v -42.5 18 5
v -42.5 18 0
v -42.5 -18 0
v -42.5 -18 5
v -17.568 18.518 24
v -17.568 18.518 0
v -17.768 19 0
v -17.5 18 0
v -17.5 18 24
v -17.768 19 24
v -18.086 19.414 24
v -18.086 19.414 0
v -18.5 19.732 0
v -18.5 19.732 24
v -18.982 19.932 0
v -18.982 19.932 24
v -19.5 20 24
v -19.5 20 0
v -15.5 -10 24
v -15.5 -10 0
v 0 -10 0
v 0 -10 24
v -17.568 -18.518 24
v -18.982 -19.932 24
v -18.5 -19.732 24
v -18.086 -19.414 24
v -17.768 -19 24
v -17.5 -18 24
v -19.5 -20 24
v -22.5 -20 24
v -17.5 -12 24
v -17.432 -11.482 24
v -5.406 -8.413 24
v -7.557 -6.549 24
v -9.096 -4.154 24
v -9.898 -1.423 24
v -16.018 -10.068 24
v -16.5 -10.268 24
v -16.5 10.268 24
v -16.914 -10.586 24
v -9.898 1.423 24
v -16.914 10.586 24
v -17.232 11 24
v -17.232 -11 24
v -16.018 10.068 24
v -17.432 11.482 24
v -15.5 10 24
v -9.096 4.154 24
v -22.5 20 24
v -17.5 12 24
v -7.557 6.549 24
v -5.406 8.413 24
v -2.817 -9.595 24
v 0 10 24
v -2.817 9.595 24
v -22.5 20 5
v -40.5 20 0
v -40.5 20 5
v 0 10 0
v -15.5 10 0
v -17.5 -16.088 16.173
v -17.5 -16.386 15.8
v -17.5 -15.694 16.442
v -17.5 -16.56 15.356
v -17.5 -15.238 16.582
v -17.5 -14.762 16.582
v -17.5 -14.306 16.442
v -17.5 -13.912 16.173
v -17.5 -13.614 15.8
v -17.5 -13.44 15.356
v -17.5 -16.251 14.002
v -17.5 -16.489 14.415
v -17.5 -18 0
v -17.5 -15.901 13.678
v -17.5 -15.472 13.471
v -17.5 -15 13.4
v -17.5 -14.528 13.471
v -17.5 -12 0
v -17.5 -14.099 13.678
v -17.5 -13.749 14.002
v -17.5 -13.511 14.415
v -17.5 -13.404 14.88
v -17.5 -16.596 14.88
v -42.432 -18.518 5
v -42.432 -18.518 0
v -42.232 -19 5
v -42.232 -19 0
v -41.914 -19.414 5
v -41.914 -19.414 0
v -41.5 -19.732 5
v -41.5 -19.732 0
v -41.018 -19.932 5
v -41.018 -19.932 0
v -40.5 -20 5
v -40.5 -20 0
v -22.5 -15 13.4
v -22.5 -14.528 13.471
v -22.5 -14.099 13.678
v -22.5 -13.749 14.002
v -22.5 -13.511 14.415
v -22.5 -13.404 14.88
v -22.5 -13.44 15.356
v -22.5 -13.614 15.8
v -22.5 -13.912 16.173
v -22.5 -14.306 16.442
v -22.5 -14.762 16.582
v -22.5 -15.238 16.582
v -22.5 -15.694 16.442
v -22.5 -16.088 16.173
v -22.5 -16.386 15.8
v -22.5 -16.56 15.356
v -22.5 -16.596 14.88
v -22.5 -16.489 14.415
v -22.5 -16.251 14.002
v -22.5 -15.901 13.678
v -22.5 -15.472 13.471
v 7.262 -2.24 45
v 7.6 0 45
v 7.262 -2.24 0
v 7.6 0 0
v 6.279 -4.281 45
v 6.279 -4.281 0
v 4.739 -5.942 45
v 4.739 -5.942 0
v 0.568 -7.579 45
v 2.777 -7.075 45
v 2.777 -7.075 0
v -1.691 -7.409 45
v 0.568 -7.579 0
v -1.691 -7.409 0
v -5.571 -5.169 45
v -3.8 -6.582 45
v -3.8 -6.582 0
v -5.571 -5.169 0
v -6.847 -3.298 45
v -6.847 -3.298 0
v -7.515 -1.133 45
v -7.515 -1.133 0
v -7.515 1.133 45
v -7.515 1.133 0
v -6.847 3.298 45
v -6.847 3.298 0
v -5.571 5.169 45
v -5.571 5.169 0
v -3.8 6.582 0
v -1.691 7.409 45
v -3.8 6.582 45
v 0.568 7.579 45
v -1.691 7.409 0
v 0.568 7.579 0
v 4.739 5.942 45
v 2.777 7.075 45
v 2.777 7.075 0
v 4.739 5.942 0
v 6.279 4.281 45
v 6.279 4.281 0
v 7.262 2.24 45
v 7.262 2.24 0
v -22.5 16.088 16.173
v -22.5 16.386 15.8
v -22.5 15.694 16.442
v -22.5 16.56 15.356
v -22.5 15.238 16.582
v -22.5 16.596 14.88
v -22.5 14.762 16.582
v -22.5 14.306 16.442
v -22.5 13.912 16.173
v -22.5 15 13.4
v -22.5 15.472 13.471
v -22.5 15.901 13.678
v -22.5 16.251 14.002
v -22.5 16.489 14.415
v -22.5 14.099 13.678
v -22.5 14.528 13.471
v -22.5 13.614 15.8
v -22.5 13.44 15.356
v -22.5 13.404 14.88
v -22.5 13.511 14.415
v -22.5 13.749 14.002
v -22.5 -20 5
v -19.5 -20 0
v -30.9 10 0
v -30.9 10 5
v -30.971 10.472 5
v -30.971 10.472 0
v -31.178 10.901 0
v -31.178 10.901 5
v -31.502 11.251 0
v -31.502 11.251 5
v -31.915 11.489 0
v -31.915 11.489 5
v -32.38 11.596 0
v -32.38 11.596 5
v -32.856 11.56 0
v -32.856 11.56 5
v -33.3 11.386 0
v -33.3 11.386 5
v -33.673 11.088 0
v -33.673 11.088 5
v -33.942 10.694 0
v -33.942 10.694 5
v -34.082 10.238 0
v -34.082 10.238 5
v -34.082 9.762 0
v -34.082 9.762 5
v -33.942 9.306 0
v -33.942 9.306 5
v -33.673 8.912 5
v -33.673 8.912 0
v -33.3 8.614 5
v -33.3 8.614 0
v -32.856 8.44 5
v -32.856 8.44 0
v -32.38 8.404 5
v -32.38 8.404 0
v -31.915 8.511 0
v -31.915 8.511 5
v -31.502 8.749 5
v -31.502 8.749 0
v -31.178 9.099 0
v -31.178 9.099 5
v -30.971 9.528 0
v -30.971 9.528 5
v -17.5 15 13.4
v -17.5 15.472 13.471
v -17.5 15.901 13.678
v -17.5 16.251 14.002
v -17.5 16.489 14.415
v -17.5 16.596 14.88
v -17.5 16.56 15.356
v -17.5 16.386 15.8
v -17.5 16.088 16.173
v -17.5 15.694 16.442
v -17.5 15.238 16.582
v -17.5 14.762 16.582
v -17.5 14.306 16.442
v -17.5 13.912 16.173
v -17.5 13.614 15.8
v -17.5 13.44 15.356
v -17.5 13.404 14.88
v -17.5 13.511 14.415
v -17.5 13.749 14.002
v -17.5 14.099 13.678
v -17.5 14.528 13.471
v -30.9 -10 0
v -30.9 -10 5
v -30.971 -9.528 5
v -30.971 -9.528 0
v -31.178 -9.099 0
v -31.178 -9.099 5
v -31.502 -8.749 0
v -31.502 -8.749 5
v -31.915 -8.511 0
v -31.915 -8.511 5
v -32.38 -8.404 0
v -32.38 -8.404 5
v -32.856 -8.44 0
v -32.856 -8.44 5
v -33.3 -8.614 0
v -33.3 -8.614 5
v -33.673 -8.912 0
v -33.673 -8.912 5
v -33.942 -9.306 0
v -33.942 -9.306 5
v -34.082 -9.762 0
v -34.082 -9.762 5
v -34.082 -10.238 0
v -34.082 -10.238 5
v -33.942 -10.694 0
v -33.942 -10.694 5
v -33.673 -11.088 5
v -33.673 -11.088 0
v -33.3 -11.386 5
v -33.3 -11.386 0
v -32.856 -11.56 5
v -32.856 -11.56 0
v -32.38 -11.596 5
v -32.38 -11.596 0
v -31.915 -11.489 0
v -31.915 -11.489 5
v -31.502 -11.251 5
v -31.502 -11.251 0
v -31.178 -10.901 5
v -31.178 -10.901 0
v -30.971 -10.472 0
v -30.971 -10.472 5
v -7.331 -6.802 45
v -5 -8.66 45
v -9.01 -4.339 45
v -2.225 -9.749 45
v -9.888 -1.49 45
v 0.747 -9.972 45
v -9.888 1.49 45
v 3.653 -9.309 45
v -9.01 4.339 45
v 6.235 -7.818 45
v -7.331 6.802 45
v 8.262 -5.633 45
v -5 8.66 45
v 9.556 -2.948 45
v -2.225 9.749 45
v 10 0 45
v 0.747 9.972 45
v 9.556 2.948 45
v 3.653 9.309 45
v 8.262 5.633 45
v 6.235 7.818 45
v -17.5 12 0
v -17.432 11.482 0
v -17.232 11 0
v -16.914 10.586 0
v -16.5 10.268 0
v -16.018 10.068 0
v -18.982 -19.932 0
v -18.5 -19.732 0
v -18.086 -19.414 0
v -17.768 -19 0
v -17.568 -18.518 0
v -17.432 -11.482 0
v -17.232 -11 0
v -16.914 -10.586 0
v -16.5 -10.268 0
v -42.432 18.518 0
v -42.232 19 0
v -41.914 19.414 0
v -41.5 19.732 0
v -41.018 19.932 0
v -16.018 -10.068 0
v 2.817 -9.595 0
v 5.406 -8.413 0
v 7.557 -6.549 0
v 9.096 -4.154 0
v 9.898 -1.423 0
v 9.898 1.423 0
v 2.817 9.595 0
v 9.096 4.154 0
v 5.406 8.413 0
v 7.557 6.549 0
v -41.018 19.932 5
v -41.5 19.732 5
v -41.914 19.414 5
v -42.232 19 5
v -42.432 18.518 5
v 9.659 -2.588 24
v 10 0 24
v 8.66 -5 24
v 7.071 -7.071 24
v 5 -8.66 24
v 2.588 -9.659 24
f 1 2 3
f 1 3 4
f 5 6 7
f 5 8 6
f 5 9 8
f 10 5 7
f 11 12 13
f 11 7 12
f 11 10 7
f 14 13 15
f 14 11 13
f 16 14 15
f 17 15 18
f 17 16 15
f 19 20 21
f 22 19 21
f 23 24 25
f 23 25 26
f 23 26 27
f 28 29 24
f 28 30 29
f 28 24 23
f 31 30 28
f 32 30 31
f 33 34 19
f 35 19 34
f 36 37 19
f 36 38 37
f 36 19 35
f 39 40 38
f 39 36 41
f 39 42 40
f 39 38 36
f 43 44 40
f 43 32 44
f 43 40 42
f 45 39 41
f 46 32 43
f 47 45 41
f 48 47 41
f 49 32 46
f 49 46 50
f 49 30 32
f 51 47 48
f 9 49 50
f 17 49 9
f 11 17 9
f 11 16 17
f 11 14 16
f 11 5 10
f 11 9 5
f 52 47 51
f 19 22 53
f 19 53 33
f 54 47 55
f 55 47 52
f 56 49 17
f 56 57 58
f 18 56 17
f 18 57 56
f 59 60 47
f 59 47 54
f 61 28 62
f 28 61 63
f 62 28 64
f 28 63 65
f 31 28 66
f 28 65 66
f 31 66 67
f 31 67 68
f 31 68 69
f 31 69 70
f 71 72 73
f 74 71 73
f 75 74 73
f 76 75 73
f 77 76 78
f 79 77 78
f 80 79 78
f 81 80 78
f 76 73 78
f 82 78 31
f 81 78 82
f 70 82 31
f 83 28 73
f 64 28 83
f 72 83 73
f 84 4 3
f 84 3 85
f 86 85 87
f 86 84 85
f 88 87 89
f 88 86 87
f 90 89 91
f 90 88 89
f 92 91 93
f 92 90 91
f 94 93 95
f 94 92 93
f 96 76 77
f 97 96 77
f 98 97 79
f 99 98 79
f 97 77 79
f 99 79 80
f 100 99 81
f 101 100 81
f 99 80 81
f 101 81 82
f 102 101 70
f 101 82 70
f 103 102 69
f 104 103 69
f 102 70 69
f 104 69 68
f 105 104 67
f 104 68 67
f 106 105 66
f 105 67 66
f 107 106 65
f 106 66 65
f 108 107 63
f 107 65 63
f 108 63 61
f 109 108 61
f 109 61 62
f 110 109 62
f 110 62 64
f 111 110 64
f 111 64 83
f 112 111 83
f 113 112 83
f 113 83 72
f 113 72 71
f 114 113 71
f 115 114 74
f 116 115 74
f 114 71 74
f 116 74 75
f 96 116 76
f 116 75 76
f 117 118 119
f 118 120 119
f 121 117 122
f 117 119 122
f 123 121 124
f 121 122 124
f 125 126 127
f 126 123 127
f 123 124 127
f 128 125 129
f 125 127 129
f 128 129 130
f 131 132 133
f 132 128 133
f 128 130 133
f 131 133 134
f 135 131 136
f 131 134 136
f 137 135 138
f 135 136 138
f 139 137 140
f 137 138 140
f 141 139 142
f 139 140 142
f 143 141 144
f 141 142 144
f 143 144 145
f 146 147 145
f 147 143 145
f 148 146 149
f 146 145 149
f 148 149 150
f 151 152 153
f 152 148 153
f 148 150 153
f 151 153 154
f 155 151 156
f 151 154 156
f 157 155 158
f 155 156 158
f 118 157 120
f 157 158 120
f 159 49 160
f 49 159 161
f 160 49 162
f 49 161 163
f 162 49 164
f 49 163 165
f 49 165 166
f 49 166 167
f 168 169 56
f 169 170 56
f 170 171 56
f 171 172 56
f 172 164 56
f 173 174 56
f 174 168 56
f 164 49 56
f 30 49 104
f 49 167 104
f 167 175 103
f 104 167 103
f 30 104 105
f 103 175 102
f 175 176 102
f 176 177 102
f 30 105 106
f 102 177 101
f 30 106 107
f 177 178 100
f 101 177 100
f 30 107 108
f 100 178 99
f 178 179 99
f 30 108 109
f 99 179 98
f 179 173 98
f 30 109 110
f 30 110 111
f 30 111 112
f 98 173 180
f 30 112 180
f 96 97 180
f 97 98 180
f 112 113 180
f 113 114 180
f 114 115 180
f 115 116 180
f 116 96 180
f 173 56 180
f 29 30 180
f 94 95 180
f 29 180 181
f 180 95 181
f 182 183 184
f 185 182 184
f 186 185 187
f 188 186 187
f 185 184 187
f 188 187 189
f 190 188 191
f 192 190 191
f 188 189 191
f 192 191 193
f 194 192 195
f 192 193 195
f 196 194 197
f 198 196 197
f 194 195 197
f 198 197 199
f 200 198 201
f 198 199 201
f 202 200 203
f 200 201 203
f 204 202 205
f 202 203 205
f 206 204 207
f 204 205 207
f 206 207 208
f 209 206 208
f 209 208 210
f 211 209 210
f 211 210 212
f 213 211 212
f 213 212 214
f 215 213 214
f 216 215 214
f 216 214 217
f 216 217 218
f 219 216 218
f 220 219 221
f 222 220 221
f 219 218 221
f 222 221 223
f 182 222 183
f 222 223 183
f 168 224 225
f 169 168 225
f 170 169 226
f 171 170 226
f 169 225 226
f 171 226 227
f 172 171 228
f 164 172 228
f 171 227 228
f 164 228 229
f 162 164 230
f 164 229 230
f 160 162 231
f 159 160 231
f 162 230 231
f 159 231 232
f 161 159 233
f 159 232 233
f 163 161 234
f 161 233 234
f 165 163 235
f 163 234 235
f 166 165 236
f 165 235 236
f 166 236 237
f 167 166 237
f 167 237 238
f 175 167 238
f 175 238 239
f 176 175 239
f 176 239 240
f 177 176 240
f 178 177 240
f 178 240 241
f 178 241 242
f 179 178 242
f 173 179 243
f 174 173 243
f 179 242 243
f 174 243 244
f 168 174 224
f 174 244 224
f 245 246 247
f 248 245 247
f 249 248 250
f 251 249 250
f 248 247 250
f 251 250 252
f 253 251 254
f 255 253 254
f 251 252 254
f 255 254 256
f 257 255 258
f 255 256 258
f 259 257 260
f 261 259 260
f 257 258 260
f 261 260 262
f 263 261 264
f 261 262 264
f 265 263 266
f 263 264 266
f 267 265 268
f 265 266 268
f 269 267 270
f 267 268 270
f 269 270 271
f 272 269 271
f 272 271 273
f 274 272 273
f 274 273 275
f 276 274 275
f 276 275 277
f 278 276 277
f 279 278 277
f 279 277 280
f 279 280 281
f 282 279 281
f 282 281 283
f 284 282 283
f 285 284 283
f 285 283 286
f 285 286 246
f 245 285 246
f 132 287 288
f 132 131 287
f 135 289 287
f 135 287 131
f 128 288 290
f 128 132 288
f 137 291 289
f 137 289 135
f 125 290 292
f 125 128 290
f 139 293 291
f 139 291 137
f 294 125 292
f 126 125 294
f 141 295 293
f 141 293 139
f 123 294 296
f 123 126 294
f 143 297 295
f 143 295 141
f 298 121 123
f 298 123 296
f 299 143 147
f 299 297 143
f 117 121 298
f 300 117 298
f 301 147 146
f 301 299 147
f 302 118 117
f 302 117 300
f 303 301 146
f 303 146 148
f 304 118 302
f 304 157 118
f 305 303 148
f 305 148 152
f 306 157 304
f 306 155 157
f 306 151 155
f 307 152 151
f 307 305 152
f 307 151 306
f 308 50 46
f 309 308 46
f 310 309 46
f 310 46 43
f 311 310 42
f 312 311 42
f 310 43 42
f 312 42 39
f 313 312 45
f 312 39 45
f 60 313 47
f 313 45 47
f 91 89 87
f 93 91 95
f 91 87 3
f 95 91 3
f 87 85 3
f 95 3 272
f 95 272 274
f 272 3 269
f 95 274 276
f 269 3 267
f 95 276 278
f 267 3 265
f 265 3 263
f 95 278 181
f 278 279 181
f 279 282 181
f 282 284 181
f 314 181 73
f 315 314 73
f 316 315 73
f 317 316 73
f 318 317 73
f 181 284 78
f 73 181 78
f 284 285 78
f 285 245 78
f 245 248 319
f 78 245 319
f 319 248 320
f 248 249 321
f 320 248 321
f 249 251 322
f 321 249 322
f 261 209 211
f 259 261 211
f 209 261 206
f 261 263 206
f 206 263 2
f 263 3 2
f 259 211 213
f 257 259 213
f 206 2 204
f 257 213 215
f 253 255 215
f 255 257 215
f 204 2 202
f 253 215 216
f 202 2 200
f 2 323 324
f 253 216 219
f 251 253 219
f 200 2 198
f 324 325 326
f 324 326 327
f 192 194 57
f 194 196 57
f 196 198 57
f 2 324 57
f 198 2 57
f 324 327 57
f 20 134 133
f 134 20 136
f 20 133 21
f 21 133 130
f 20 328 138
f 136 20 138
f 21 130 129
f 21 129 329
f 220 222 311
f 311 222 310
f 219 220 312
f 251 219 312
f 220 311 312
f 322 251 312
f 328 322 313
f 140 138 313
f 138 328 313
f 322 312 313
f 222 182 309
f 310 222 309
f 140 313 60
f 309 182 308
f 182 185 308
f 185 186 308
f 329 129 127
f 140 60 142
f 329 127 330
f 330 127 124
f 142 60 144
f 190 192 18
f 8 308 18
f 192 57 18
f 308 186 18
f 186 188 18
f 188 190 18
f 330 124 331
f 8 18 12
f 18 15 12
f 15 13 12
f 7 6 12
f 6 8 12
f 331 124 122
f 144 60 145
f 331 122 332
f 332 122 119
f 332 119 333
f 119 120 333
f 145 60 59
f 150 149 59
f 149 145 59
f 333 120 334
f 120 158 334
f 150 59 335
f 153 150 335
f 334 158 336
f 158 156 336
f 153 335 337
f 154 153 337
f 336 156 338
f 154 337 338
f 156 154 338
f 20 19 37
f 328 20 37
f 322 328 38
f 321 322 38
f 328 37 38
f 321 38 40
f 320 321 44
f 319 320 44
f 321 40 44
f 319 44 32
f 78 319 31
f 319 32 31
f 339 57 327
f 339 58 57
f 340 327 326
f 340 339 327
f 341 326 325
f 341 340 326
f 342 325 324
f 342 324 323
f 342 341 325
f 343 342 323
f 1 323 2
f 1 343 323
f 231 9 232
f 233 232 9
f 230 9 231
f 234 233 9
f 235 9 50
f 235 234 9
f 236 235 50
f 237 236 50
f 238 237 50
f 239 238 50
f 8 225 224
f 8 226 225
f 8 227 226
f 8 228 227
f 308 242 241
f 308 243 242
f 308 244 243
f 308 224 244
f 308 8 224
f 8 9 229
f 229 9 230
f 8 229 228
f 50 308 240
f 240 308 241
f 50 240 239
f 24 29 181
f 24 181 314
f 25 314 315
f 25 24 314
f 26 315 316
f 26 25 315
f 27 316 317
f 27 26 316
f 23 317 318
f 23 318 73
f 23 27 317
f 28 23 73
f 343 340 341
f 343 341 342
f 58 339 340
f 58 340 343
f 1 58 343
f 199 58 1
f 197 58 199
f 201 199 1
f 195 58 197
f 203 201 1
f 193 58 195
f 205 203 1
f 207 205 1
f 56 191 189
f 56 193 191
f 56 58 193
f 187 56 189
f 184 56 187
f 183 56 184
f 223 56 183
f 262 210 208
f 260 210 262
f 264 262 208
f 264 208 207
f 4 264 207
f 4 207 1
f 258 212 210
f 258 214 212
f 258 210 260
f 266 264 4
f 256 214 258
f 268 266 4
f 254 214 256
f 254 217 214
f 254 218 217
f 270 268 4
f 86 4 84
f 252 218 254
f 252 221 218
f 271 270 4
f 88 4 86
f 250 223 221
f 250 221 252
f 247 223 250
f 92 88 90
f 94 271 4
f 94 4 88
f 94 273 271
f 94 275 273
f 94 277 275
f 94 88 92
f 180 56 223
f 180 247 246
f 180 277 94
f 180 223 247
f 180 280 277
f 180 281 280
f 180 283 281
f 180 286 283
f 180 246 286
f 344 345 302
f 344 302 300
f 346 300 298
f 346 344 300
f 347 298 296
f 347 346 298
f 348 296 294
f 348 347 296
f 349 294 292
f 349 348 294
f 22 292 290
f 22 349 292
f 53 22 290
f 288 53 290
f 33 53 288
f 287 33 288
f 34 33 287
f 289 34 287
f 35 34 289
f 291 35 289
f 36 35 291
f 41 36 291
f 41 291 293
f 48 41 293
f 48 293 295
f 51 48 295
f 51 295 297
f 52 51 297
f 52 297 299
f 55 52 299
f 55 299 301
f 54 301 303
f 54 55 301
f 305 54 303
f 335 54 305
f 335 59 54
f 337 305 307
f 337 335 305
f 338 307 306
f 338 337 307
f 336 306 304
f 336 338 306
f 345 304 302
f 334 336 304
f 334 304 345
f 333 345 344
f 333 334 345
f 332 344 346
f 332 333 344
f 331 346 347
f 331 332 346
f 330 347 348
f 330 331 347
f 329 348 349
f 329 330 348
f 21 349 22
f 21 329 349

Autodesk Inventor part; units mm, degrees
ref_plane "YZ Plane" through (0, 0, 0) normal (1, 0, 0) x (0, 1, 0)
ref_plane "XZ Plane" through (0, 0, 0) normal (0, 1, 0) x (-1, 0, 0)
ref_plane "XY Plane" through (0, 0, 0) normal (0, 0, 1) x (1, 0, 0)
sketch "Skizze1" plane through (0, 0, 0) normal (0, 0, 1) x (1, 0, 0)
  circle A0 centre (0, 0) radius 7.6
  line L0 (-22.5, 20) -> (-22.5, -20)
  line L1 (-22.5, -20) -> (-17.5, -20)
  line L2 (-17.5, -20) -> (-17.5, -10)
  line L3 (-22.5, 20) -> (-17.5, 20)
  line L4 (-17.5, 20) -> (-17.5, 10)
  line L5 (-17.5, 10) -> (0, 10)
  line L6 (-17.5, -10) -> (0, -10)
  arc A1 (0, -10) -> (0, 10) centre (0, 0) ccw
  dimension "d0" = 15.2
  dimension "d23" = 5
  dimension "d24" = 10
  dimension "d25" = 5
  dimension "d26" = 10
  dimension "d27" = 40
  dimension "d28" = 20
  dimension "d38" = 22.5
extrude "Extrusion1" add sketch "Skizze1" along normal blind 24
sketch "Skizze2" plane through (-22.5, -20, 0) normal (-1, 0, 0) x (0, 0, 1)
  line L0 (0, 40) -> (0, 0) projected
  line L1 (0, 0) -> (24, 0) projected
  line L2 (0, 40) -> (5, 40)
  line L3 (5, 40) -> (5, 0)
  line L4 (5, 0) -> (0, 0)
  line L5 (0, 0) -> (0, 40)
  point P0 (0, 20)
  dimension "d12" = 5
extrude "Extrusion2" add sketch "Skizze2" along normal blind 20
sketch "Skizze3" plane through (-22.5, -20, 5) normal (0, 0, 1) x (1, 0, 0)
  circle A0 centre (-10, 30) radius 1.6
  line L0 (0, 40) -> (-20, 40) projected
  line L1 (-20, 0) -> (-20, 40) projected
  circle A1 centre (-10, 10) radius 1.6
  line L2 (0, 0) -> (-20, 0) projected
  point P0 (22.5, 20)
  dimension "d15" = 3.2
  dimension "d16" = 10
  dimension "d17" = 10
  dimension "d18" = 3.2
  dimension "d19" = 10
  dimension "d20" = 10
extrude "Extrusion3" cut sketch "Skizze3" against normal through all
fillet "Rundung1" radius 2 6 edges at (-17.5, -10, 12) (-17.5, 10, 12) (-17.5, 20, 12) (-17.5, -20, 12) (-42.5, -20, 2.5) (-42.5, 20, 2.5)
sketch "Skizze4" plane through (-17.5, -18, 0) normal (1, 0, 0) x (0, 0, -1)
  circle A0 centre (-15, 3) radius 1.6
  circle A1 centre (-15, 33) radius 1.6
  line L0 (0, 0) -> (0, 6) projected
  line L1 (-24, -2) -> (0, -2) projected
  line L2 (-5, 38) -> (-24, 38) projected
  point P0 (0, 18)
  dimension "d30" = 3.2
  dimension "d31" = 3.2
  dimension "d32" = 15
  dimension "d33" = 5
  dimension "d34" = 15
  dimension "d35" = 5
extrude "Extrusion4" cut sketch "Skizze4" against normal through all
sketch "Skizze5" plane through (0, 0, 24) normal (0, 0, 1) x (1, 0, 0)
  circle A0 centre (0, 0) radius 7.6
  circle A1 centre (0, 0) radius 10
extrude "Extrusion5" add sketch "Skizze5" along normal blind 21
properties part number "flange" material "ABS-Kunststoff"
